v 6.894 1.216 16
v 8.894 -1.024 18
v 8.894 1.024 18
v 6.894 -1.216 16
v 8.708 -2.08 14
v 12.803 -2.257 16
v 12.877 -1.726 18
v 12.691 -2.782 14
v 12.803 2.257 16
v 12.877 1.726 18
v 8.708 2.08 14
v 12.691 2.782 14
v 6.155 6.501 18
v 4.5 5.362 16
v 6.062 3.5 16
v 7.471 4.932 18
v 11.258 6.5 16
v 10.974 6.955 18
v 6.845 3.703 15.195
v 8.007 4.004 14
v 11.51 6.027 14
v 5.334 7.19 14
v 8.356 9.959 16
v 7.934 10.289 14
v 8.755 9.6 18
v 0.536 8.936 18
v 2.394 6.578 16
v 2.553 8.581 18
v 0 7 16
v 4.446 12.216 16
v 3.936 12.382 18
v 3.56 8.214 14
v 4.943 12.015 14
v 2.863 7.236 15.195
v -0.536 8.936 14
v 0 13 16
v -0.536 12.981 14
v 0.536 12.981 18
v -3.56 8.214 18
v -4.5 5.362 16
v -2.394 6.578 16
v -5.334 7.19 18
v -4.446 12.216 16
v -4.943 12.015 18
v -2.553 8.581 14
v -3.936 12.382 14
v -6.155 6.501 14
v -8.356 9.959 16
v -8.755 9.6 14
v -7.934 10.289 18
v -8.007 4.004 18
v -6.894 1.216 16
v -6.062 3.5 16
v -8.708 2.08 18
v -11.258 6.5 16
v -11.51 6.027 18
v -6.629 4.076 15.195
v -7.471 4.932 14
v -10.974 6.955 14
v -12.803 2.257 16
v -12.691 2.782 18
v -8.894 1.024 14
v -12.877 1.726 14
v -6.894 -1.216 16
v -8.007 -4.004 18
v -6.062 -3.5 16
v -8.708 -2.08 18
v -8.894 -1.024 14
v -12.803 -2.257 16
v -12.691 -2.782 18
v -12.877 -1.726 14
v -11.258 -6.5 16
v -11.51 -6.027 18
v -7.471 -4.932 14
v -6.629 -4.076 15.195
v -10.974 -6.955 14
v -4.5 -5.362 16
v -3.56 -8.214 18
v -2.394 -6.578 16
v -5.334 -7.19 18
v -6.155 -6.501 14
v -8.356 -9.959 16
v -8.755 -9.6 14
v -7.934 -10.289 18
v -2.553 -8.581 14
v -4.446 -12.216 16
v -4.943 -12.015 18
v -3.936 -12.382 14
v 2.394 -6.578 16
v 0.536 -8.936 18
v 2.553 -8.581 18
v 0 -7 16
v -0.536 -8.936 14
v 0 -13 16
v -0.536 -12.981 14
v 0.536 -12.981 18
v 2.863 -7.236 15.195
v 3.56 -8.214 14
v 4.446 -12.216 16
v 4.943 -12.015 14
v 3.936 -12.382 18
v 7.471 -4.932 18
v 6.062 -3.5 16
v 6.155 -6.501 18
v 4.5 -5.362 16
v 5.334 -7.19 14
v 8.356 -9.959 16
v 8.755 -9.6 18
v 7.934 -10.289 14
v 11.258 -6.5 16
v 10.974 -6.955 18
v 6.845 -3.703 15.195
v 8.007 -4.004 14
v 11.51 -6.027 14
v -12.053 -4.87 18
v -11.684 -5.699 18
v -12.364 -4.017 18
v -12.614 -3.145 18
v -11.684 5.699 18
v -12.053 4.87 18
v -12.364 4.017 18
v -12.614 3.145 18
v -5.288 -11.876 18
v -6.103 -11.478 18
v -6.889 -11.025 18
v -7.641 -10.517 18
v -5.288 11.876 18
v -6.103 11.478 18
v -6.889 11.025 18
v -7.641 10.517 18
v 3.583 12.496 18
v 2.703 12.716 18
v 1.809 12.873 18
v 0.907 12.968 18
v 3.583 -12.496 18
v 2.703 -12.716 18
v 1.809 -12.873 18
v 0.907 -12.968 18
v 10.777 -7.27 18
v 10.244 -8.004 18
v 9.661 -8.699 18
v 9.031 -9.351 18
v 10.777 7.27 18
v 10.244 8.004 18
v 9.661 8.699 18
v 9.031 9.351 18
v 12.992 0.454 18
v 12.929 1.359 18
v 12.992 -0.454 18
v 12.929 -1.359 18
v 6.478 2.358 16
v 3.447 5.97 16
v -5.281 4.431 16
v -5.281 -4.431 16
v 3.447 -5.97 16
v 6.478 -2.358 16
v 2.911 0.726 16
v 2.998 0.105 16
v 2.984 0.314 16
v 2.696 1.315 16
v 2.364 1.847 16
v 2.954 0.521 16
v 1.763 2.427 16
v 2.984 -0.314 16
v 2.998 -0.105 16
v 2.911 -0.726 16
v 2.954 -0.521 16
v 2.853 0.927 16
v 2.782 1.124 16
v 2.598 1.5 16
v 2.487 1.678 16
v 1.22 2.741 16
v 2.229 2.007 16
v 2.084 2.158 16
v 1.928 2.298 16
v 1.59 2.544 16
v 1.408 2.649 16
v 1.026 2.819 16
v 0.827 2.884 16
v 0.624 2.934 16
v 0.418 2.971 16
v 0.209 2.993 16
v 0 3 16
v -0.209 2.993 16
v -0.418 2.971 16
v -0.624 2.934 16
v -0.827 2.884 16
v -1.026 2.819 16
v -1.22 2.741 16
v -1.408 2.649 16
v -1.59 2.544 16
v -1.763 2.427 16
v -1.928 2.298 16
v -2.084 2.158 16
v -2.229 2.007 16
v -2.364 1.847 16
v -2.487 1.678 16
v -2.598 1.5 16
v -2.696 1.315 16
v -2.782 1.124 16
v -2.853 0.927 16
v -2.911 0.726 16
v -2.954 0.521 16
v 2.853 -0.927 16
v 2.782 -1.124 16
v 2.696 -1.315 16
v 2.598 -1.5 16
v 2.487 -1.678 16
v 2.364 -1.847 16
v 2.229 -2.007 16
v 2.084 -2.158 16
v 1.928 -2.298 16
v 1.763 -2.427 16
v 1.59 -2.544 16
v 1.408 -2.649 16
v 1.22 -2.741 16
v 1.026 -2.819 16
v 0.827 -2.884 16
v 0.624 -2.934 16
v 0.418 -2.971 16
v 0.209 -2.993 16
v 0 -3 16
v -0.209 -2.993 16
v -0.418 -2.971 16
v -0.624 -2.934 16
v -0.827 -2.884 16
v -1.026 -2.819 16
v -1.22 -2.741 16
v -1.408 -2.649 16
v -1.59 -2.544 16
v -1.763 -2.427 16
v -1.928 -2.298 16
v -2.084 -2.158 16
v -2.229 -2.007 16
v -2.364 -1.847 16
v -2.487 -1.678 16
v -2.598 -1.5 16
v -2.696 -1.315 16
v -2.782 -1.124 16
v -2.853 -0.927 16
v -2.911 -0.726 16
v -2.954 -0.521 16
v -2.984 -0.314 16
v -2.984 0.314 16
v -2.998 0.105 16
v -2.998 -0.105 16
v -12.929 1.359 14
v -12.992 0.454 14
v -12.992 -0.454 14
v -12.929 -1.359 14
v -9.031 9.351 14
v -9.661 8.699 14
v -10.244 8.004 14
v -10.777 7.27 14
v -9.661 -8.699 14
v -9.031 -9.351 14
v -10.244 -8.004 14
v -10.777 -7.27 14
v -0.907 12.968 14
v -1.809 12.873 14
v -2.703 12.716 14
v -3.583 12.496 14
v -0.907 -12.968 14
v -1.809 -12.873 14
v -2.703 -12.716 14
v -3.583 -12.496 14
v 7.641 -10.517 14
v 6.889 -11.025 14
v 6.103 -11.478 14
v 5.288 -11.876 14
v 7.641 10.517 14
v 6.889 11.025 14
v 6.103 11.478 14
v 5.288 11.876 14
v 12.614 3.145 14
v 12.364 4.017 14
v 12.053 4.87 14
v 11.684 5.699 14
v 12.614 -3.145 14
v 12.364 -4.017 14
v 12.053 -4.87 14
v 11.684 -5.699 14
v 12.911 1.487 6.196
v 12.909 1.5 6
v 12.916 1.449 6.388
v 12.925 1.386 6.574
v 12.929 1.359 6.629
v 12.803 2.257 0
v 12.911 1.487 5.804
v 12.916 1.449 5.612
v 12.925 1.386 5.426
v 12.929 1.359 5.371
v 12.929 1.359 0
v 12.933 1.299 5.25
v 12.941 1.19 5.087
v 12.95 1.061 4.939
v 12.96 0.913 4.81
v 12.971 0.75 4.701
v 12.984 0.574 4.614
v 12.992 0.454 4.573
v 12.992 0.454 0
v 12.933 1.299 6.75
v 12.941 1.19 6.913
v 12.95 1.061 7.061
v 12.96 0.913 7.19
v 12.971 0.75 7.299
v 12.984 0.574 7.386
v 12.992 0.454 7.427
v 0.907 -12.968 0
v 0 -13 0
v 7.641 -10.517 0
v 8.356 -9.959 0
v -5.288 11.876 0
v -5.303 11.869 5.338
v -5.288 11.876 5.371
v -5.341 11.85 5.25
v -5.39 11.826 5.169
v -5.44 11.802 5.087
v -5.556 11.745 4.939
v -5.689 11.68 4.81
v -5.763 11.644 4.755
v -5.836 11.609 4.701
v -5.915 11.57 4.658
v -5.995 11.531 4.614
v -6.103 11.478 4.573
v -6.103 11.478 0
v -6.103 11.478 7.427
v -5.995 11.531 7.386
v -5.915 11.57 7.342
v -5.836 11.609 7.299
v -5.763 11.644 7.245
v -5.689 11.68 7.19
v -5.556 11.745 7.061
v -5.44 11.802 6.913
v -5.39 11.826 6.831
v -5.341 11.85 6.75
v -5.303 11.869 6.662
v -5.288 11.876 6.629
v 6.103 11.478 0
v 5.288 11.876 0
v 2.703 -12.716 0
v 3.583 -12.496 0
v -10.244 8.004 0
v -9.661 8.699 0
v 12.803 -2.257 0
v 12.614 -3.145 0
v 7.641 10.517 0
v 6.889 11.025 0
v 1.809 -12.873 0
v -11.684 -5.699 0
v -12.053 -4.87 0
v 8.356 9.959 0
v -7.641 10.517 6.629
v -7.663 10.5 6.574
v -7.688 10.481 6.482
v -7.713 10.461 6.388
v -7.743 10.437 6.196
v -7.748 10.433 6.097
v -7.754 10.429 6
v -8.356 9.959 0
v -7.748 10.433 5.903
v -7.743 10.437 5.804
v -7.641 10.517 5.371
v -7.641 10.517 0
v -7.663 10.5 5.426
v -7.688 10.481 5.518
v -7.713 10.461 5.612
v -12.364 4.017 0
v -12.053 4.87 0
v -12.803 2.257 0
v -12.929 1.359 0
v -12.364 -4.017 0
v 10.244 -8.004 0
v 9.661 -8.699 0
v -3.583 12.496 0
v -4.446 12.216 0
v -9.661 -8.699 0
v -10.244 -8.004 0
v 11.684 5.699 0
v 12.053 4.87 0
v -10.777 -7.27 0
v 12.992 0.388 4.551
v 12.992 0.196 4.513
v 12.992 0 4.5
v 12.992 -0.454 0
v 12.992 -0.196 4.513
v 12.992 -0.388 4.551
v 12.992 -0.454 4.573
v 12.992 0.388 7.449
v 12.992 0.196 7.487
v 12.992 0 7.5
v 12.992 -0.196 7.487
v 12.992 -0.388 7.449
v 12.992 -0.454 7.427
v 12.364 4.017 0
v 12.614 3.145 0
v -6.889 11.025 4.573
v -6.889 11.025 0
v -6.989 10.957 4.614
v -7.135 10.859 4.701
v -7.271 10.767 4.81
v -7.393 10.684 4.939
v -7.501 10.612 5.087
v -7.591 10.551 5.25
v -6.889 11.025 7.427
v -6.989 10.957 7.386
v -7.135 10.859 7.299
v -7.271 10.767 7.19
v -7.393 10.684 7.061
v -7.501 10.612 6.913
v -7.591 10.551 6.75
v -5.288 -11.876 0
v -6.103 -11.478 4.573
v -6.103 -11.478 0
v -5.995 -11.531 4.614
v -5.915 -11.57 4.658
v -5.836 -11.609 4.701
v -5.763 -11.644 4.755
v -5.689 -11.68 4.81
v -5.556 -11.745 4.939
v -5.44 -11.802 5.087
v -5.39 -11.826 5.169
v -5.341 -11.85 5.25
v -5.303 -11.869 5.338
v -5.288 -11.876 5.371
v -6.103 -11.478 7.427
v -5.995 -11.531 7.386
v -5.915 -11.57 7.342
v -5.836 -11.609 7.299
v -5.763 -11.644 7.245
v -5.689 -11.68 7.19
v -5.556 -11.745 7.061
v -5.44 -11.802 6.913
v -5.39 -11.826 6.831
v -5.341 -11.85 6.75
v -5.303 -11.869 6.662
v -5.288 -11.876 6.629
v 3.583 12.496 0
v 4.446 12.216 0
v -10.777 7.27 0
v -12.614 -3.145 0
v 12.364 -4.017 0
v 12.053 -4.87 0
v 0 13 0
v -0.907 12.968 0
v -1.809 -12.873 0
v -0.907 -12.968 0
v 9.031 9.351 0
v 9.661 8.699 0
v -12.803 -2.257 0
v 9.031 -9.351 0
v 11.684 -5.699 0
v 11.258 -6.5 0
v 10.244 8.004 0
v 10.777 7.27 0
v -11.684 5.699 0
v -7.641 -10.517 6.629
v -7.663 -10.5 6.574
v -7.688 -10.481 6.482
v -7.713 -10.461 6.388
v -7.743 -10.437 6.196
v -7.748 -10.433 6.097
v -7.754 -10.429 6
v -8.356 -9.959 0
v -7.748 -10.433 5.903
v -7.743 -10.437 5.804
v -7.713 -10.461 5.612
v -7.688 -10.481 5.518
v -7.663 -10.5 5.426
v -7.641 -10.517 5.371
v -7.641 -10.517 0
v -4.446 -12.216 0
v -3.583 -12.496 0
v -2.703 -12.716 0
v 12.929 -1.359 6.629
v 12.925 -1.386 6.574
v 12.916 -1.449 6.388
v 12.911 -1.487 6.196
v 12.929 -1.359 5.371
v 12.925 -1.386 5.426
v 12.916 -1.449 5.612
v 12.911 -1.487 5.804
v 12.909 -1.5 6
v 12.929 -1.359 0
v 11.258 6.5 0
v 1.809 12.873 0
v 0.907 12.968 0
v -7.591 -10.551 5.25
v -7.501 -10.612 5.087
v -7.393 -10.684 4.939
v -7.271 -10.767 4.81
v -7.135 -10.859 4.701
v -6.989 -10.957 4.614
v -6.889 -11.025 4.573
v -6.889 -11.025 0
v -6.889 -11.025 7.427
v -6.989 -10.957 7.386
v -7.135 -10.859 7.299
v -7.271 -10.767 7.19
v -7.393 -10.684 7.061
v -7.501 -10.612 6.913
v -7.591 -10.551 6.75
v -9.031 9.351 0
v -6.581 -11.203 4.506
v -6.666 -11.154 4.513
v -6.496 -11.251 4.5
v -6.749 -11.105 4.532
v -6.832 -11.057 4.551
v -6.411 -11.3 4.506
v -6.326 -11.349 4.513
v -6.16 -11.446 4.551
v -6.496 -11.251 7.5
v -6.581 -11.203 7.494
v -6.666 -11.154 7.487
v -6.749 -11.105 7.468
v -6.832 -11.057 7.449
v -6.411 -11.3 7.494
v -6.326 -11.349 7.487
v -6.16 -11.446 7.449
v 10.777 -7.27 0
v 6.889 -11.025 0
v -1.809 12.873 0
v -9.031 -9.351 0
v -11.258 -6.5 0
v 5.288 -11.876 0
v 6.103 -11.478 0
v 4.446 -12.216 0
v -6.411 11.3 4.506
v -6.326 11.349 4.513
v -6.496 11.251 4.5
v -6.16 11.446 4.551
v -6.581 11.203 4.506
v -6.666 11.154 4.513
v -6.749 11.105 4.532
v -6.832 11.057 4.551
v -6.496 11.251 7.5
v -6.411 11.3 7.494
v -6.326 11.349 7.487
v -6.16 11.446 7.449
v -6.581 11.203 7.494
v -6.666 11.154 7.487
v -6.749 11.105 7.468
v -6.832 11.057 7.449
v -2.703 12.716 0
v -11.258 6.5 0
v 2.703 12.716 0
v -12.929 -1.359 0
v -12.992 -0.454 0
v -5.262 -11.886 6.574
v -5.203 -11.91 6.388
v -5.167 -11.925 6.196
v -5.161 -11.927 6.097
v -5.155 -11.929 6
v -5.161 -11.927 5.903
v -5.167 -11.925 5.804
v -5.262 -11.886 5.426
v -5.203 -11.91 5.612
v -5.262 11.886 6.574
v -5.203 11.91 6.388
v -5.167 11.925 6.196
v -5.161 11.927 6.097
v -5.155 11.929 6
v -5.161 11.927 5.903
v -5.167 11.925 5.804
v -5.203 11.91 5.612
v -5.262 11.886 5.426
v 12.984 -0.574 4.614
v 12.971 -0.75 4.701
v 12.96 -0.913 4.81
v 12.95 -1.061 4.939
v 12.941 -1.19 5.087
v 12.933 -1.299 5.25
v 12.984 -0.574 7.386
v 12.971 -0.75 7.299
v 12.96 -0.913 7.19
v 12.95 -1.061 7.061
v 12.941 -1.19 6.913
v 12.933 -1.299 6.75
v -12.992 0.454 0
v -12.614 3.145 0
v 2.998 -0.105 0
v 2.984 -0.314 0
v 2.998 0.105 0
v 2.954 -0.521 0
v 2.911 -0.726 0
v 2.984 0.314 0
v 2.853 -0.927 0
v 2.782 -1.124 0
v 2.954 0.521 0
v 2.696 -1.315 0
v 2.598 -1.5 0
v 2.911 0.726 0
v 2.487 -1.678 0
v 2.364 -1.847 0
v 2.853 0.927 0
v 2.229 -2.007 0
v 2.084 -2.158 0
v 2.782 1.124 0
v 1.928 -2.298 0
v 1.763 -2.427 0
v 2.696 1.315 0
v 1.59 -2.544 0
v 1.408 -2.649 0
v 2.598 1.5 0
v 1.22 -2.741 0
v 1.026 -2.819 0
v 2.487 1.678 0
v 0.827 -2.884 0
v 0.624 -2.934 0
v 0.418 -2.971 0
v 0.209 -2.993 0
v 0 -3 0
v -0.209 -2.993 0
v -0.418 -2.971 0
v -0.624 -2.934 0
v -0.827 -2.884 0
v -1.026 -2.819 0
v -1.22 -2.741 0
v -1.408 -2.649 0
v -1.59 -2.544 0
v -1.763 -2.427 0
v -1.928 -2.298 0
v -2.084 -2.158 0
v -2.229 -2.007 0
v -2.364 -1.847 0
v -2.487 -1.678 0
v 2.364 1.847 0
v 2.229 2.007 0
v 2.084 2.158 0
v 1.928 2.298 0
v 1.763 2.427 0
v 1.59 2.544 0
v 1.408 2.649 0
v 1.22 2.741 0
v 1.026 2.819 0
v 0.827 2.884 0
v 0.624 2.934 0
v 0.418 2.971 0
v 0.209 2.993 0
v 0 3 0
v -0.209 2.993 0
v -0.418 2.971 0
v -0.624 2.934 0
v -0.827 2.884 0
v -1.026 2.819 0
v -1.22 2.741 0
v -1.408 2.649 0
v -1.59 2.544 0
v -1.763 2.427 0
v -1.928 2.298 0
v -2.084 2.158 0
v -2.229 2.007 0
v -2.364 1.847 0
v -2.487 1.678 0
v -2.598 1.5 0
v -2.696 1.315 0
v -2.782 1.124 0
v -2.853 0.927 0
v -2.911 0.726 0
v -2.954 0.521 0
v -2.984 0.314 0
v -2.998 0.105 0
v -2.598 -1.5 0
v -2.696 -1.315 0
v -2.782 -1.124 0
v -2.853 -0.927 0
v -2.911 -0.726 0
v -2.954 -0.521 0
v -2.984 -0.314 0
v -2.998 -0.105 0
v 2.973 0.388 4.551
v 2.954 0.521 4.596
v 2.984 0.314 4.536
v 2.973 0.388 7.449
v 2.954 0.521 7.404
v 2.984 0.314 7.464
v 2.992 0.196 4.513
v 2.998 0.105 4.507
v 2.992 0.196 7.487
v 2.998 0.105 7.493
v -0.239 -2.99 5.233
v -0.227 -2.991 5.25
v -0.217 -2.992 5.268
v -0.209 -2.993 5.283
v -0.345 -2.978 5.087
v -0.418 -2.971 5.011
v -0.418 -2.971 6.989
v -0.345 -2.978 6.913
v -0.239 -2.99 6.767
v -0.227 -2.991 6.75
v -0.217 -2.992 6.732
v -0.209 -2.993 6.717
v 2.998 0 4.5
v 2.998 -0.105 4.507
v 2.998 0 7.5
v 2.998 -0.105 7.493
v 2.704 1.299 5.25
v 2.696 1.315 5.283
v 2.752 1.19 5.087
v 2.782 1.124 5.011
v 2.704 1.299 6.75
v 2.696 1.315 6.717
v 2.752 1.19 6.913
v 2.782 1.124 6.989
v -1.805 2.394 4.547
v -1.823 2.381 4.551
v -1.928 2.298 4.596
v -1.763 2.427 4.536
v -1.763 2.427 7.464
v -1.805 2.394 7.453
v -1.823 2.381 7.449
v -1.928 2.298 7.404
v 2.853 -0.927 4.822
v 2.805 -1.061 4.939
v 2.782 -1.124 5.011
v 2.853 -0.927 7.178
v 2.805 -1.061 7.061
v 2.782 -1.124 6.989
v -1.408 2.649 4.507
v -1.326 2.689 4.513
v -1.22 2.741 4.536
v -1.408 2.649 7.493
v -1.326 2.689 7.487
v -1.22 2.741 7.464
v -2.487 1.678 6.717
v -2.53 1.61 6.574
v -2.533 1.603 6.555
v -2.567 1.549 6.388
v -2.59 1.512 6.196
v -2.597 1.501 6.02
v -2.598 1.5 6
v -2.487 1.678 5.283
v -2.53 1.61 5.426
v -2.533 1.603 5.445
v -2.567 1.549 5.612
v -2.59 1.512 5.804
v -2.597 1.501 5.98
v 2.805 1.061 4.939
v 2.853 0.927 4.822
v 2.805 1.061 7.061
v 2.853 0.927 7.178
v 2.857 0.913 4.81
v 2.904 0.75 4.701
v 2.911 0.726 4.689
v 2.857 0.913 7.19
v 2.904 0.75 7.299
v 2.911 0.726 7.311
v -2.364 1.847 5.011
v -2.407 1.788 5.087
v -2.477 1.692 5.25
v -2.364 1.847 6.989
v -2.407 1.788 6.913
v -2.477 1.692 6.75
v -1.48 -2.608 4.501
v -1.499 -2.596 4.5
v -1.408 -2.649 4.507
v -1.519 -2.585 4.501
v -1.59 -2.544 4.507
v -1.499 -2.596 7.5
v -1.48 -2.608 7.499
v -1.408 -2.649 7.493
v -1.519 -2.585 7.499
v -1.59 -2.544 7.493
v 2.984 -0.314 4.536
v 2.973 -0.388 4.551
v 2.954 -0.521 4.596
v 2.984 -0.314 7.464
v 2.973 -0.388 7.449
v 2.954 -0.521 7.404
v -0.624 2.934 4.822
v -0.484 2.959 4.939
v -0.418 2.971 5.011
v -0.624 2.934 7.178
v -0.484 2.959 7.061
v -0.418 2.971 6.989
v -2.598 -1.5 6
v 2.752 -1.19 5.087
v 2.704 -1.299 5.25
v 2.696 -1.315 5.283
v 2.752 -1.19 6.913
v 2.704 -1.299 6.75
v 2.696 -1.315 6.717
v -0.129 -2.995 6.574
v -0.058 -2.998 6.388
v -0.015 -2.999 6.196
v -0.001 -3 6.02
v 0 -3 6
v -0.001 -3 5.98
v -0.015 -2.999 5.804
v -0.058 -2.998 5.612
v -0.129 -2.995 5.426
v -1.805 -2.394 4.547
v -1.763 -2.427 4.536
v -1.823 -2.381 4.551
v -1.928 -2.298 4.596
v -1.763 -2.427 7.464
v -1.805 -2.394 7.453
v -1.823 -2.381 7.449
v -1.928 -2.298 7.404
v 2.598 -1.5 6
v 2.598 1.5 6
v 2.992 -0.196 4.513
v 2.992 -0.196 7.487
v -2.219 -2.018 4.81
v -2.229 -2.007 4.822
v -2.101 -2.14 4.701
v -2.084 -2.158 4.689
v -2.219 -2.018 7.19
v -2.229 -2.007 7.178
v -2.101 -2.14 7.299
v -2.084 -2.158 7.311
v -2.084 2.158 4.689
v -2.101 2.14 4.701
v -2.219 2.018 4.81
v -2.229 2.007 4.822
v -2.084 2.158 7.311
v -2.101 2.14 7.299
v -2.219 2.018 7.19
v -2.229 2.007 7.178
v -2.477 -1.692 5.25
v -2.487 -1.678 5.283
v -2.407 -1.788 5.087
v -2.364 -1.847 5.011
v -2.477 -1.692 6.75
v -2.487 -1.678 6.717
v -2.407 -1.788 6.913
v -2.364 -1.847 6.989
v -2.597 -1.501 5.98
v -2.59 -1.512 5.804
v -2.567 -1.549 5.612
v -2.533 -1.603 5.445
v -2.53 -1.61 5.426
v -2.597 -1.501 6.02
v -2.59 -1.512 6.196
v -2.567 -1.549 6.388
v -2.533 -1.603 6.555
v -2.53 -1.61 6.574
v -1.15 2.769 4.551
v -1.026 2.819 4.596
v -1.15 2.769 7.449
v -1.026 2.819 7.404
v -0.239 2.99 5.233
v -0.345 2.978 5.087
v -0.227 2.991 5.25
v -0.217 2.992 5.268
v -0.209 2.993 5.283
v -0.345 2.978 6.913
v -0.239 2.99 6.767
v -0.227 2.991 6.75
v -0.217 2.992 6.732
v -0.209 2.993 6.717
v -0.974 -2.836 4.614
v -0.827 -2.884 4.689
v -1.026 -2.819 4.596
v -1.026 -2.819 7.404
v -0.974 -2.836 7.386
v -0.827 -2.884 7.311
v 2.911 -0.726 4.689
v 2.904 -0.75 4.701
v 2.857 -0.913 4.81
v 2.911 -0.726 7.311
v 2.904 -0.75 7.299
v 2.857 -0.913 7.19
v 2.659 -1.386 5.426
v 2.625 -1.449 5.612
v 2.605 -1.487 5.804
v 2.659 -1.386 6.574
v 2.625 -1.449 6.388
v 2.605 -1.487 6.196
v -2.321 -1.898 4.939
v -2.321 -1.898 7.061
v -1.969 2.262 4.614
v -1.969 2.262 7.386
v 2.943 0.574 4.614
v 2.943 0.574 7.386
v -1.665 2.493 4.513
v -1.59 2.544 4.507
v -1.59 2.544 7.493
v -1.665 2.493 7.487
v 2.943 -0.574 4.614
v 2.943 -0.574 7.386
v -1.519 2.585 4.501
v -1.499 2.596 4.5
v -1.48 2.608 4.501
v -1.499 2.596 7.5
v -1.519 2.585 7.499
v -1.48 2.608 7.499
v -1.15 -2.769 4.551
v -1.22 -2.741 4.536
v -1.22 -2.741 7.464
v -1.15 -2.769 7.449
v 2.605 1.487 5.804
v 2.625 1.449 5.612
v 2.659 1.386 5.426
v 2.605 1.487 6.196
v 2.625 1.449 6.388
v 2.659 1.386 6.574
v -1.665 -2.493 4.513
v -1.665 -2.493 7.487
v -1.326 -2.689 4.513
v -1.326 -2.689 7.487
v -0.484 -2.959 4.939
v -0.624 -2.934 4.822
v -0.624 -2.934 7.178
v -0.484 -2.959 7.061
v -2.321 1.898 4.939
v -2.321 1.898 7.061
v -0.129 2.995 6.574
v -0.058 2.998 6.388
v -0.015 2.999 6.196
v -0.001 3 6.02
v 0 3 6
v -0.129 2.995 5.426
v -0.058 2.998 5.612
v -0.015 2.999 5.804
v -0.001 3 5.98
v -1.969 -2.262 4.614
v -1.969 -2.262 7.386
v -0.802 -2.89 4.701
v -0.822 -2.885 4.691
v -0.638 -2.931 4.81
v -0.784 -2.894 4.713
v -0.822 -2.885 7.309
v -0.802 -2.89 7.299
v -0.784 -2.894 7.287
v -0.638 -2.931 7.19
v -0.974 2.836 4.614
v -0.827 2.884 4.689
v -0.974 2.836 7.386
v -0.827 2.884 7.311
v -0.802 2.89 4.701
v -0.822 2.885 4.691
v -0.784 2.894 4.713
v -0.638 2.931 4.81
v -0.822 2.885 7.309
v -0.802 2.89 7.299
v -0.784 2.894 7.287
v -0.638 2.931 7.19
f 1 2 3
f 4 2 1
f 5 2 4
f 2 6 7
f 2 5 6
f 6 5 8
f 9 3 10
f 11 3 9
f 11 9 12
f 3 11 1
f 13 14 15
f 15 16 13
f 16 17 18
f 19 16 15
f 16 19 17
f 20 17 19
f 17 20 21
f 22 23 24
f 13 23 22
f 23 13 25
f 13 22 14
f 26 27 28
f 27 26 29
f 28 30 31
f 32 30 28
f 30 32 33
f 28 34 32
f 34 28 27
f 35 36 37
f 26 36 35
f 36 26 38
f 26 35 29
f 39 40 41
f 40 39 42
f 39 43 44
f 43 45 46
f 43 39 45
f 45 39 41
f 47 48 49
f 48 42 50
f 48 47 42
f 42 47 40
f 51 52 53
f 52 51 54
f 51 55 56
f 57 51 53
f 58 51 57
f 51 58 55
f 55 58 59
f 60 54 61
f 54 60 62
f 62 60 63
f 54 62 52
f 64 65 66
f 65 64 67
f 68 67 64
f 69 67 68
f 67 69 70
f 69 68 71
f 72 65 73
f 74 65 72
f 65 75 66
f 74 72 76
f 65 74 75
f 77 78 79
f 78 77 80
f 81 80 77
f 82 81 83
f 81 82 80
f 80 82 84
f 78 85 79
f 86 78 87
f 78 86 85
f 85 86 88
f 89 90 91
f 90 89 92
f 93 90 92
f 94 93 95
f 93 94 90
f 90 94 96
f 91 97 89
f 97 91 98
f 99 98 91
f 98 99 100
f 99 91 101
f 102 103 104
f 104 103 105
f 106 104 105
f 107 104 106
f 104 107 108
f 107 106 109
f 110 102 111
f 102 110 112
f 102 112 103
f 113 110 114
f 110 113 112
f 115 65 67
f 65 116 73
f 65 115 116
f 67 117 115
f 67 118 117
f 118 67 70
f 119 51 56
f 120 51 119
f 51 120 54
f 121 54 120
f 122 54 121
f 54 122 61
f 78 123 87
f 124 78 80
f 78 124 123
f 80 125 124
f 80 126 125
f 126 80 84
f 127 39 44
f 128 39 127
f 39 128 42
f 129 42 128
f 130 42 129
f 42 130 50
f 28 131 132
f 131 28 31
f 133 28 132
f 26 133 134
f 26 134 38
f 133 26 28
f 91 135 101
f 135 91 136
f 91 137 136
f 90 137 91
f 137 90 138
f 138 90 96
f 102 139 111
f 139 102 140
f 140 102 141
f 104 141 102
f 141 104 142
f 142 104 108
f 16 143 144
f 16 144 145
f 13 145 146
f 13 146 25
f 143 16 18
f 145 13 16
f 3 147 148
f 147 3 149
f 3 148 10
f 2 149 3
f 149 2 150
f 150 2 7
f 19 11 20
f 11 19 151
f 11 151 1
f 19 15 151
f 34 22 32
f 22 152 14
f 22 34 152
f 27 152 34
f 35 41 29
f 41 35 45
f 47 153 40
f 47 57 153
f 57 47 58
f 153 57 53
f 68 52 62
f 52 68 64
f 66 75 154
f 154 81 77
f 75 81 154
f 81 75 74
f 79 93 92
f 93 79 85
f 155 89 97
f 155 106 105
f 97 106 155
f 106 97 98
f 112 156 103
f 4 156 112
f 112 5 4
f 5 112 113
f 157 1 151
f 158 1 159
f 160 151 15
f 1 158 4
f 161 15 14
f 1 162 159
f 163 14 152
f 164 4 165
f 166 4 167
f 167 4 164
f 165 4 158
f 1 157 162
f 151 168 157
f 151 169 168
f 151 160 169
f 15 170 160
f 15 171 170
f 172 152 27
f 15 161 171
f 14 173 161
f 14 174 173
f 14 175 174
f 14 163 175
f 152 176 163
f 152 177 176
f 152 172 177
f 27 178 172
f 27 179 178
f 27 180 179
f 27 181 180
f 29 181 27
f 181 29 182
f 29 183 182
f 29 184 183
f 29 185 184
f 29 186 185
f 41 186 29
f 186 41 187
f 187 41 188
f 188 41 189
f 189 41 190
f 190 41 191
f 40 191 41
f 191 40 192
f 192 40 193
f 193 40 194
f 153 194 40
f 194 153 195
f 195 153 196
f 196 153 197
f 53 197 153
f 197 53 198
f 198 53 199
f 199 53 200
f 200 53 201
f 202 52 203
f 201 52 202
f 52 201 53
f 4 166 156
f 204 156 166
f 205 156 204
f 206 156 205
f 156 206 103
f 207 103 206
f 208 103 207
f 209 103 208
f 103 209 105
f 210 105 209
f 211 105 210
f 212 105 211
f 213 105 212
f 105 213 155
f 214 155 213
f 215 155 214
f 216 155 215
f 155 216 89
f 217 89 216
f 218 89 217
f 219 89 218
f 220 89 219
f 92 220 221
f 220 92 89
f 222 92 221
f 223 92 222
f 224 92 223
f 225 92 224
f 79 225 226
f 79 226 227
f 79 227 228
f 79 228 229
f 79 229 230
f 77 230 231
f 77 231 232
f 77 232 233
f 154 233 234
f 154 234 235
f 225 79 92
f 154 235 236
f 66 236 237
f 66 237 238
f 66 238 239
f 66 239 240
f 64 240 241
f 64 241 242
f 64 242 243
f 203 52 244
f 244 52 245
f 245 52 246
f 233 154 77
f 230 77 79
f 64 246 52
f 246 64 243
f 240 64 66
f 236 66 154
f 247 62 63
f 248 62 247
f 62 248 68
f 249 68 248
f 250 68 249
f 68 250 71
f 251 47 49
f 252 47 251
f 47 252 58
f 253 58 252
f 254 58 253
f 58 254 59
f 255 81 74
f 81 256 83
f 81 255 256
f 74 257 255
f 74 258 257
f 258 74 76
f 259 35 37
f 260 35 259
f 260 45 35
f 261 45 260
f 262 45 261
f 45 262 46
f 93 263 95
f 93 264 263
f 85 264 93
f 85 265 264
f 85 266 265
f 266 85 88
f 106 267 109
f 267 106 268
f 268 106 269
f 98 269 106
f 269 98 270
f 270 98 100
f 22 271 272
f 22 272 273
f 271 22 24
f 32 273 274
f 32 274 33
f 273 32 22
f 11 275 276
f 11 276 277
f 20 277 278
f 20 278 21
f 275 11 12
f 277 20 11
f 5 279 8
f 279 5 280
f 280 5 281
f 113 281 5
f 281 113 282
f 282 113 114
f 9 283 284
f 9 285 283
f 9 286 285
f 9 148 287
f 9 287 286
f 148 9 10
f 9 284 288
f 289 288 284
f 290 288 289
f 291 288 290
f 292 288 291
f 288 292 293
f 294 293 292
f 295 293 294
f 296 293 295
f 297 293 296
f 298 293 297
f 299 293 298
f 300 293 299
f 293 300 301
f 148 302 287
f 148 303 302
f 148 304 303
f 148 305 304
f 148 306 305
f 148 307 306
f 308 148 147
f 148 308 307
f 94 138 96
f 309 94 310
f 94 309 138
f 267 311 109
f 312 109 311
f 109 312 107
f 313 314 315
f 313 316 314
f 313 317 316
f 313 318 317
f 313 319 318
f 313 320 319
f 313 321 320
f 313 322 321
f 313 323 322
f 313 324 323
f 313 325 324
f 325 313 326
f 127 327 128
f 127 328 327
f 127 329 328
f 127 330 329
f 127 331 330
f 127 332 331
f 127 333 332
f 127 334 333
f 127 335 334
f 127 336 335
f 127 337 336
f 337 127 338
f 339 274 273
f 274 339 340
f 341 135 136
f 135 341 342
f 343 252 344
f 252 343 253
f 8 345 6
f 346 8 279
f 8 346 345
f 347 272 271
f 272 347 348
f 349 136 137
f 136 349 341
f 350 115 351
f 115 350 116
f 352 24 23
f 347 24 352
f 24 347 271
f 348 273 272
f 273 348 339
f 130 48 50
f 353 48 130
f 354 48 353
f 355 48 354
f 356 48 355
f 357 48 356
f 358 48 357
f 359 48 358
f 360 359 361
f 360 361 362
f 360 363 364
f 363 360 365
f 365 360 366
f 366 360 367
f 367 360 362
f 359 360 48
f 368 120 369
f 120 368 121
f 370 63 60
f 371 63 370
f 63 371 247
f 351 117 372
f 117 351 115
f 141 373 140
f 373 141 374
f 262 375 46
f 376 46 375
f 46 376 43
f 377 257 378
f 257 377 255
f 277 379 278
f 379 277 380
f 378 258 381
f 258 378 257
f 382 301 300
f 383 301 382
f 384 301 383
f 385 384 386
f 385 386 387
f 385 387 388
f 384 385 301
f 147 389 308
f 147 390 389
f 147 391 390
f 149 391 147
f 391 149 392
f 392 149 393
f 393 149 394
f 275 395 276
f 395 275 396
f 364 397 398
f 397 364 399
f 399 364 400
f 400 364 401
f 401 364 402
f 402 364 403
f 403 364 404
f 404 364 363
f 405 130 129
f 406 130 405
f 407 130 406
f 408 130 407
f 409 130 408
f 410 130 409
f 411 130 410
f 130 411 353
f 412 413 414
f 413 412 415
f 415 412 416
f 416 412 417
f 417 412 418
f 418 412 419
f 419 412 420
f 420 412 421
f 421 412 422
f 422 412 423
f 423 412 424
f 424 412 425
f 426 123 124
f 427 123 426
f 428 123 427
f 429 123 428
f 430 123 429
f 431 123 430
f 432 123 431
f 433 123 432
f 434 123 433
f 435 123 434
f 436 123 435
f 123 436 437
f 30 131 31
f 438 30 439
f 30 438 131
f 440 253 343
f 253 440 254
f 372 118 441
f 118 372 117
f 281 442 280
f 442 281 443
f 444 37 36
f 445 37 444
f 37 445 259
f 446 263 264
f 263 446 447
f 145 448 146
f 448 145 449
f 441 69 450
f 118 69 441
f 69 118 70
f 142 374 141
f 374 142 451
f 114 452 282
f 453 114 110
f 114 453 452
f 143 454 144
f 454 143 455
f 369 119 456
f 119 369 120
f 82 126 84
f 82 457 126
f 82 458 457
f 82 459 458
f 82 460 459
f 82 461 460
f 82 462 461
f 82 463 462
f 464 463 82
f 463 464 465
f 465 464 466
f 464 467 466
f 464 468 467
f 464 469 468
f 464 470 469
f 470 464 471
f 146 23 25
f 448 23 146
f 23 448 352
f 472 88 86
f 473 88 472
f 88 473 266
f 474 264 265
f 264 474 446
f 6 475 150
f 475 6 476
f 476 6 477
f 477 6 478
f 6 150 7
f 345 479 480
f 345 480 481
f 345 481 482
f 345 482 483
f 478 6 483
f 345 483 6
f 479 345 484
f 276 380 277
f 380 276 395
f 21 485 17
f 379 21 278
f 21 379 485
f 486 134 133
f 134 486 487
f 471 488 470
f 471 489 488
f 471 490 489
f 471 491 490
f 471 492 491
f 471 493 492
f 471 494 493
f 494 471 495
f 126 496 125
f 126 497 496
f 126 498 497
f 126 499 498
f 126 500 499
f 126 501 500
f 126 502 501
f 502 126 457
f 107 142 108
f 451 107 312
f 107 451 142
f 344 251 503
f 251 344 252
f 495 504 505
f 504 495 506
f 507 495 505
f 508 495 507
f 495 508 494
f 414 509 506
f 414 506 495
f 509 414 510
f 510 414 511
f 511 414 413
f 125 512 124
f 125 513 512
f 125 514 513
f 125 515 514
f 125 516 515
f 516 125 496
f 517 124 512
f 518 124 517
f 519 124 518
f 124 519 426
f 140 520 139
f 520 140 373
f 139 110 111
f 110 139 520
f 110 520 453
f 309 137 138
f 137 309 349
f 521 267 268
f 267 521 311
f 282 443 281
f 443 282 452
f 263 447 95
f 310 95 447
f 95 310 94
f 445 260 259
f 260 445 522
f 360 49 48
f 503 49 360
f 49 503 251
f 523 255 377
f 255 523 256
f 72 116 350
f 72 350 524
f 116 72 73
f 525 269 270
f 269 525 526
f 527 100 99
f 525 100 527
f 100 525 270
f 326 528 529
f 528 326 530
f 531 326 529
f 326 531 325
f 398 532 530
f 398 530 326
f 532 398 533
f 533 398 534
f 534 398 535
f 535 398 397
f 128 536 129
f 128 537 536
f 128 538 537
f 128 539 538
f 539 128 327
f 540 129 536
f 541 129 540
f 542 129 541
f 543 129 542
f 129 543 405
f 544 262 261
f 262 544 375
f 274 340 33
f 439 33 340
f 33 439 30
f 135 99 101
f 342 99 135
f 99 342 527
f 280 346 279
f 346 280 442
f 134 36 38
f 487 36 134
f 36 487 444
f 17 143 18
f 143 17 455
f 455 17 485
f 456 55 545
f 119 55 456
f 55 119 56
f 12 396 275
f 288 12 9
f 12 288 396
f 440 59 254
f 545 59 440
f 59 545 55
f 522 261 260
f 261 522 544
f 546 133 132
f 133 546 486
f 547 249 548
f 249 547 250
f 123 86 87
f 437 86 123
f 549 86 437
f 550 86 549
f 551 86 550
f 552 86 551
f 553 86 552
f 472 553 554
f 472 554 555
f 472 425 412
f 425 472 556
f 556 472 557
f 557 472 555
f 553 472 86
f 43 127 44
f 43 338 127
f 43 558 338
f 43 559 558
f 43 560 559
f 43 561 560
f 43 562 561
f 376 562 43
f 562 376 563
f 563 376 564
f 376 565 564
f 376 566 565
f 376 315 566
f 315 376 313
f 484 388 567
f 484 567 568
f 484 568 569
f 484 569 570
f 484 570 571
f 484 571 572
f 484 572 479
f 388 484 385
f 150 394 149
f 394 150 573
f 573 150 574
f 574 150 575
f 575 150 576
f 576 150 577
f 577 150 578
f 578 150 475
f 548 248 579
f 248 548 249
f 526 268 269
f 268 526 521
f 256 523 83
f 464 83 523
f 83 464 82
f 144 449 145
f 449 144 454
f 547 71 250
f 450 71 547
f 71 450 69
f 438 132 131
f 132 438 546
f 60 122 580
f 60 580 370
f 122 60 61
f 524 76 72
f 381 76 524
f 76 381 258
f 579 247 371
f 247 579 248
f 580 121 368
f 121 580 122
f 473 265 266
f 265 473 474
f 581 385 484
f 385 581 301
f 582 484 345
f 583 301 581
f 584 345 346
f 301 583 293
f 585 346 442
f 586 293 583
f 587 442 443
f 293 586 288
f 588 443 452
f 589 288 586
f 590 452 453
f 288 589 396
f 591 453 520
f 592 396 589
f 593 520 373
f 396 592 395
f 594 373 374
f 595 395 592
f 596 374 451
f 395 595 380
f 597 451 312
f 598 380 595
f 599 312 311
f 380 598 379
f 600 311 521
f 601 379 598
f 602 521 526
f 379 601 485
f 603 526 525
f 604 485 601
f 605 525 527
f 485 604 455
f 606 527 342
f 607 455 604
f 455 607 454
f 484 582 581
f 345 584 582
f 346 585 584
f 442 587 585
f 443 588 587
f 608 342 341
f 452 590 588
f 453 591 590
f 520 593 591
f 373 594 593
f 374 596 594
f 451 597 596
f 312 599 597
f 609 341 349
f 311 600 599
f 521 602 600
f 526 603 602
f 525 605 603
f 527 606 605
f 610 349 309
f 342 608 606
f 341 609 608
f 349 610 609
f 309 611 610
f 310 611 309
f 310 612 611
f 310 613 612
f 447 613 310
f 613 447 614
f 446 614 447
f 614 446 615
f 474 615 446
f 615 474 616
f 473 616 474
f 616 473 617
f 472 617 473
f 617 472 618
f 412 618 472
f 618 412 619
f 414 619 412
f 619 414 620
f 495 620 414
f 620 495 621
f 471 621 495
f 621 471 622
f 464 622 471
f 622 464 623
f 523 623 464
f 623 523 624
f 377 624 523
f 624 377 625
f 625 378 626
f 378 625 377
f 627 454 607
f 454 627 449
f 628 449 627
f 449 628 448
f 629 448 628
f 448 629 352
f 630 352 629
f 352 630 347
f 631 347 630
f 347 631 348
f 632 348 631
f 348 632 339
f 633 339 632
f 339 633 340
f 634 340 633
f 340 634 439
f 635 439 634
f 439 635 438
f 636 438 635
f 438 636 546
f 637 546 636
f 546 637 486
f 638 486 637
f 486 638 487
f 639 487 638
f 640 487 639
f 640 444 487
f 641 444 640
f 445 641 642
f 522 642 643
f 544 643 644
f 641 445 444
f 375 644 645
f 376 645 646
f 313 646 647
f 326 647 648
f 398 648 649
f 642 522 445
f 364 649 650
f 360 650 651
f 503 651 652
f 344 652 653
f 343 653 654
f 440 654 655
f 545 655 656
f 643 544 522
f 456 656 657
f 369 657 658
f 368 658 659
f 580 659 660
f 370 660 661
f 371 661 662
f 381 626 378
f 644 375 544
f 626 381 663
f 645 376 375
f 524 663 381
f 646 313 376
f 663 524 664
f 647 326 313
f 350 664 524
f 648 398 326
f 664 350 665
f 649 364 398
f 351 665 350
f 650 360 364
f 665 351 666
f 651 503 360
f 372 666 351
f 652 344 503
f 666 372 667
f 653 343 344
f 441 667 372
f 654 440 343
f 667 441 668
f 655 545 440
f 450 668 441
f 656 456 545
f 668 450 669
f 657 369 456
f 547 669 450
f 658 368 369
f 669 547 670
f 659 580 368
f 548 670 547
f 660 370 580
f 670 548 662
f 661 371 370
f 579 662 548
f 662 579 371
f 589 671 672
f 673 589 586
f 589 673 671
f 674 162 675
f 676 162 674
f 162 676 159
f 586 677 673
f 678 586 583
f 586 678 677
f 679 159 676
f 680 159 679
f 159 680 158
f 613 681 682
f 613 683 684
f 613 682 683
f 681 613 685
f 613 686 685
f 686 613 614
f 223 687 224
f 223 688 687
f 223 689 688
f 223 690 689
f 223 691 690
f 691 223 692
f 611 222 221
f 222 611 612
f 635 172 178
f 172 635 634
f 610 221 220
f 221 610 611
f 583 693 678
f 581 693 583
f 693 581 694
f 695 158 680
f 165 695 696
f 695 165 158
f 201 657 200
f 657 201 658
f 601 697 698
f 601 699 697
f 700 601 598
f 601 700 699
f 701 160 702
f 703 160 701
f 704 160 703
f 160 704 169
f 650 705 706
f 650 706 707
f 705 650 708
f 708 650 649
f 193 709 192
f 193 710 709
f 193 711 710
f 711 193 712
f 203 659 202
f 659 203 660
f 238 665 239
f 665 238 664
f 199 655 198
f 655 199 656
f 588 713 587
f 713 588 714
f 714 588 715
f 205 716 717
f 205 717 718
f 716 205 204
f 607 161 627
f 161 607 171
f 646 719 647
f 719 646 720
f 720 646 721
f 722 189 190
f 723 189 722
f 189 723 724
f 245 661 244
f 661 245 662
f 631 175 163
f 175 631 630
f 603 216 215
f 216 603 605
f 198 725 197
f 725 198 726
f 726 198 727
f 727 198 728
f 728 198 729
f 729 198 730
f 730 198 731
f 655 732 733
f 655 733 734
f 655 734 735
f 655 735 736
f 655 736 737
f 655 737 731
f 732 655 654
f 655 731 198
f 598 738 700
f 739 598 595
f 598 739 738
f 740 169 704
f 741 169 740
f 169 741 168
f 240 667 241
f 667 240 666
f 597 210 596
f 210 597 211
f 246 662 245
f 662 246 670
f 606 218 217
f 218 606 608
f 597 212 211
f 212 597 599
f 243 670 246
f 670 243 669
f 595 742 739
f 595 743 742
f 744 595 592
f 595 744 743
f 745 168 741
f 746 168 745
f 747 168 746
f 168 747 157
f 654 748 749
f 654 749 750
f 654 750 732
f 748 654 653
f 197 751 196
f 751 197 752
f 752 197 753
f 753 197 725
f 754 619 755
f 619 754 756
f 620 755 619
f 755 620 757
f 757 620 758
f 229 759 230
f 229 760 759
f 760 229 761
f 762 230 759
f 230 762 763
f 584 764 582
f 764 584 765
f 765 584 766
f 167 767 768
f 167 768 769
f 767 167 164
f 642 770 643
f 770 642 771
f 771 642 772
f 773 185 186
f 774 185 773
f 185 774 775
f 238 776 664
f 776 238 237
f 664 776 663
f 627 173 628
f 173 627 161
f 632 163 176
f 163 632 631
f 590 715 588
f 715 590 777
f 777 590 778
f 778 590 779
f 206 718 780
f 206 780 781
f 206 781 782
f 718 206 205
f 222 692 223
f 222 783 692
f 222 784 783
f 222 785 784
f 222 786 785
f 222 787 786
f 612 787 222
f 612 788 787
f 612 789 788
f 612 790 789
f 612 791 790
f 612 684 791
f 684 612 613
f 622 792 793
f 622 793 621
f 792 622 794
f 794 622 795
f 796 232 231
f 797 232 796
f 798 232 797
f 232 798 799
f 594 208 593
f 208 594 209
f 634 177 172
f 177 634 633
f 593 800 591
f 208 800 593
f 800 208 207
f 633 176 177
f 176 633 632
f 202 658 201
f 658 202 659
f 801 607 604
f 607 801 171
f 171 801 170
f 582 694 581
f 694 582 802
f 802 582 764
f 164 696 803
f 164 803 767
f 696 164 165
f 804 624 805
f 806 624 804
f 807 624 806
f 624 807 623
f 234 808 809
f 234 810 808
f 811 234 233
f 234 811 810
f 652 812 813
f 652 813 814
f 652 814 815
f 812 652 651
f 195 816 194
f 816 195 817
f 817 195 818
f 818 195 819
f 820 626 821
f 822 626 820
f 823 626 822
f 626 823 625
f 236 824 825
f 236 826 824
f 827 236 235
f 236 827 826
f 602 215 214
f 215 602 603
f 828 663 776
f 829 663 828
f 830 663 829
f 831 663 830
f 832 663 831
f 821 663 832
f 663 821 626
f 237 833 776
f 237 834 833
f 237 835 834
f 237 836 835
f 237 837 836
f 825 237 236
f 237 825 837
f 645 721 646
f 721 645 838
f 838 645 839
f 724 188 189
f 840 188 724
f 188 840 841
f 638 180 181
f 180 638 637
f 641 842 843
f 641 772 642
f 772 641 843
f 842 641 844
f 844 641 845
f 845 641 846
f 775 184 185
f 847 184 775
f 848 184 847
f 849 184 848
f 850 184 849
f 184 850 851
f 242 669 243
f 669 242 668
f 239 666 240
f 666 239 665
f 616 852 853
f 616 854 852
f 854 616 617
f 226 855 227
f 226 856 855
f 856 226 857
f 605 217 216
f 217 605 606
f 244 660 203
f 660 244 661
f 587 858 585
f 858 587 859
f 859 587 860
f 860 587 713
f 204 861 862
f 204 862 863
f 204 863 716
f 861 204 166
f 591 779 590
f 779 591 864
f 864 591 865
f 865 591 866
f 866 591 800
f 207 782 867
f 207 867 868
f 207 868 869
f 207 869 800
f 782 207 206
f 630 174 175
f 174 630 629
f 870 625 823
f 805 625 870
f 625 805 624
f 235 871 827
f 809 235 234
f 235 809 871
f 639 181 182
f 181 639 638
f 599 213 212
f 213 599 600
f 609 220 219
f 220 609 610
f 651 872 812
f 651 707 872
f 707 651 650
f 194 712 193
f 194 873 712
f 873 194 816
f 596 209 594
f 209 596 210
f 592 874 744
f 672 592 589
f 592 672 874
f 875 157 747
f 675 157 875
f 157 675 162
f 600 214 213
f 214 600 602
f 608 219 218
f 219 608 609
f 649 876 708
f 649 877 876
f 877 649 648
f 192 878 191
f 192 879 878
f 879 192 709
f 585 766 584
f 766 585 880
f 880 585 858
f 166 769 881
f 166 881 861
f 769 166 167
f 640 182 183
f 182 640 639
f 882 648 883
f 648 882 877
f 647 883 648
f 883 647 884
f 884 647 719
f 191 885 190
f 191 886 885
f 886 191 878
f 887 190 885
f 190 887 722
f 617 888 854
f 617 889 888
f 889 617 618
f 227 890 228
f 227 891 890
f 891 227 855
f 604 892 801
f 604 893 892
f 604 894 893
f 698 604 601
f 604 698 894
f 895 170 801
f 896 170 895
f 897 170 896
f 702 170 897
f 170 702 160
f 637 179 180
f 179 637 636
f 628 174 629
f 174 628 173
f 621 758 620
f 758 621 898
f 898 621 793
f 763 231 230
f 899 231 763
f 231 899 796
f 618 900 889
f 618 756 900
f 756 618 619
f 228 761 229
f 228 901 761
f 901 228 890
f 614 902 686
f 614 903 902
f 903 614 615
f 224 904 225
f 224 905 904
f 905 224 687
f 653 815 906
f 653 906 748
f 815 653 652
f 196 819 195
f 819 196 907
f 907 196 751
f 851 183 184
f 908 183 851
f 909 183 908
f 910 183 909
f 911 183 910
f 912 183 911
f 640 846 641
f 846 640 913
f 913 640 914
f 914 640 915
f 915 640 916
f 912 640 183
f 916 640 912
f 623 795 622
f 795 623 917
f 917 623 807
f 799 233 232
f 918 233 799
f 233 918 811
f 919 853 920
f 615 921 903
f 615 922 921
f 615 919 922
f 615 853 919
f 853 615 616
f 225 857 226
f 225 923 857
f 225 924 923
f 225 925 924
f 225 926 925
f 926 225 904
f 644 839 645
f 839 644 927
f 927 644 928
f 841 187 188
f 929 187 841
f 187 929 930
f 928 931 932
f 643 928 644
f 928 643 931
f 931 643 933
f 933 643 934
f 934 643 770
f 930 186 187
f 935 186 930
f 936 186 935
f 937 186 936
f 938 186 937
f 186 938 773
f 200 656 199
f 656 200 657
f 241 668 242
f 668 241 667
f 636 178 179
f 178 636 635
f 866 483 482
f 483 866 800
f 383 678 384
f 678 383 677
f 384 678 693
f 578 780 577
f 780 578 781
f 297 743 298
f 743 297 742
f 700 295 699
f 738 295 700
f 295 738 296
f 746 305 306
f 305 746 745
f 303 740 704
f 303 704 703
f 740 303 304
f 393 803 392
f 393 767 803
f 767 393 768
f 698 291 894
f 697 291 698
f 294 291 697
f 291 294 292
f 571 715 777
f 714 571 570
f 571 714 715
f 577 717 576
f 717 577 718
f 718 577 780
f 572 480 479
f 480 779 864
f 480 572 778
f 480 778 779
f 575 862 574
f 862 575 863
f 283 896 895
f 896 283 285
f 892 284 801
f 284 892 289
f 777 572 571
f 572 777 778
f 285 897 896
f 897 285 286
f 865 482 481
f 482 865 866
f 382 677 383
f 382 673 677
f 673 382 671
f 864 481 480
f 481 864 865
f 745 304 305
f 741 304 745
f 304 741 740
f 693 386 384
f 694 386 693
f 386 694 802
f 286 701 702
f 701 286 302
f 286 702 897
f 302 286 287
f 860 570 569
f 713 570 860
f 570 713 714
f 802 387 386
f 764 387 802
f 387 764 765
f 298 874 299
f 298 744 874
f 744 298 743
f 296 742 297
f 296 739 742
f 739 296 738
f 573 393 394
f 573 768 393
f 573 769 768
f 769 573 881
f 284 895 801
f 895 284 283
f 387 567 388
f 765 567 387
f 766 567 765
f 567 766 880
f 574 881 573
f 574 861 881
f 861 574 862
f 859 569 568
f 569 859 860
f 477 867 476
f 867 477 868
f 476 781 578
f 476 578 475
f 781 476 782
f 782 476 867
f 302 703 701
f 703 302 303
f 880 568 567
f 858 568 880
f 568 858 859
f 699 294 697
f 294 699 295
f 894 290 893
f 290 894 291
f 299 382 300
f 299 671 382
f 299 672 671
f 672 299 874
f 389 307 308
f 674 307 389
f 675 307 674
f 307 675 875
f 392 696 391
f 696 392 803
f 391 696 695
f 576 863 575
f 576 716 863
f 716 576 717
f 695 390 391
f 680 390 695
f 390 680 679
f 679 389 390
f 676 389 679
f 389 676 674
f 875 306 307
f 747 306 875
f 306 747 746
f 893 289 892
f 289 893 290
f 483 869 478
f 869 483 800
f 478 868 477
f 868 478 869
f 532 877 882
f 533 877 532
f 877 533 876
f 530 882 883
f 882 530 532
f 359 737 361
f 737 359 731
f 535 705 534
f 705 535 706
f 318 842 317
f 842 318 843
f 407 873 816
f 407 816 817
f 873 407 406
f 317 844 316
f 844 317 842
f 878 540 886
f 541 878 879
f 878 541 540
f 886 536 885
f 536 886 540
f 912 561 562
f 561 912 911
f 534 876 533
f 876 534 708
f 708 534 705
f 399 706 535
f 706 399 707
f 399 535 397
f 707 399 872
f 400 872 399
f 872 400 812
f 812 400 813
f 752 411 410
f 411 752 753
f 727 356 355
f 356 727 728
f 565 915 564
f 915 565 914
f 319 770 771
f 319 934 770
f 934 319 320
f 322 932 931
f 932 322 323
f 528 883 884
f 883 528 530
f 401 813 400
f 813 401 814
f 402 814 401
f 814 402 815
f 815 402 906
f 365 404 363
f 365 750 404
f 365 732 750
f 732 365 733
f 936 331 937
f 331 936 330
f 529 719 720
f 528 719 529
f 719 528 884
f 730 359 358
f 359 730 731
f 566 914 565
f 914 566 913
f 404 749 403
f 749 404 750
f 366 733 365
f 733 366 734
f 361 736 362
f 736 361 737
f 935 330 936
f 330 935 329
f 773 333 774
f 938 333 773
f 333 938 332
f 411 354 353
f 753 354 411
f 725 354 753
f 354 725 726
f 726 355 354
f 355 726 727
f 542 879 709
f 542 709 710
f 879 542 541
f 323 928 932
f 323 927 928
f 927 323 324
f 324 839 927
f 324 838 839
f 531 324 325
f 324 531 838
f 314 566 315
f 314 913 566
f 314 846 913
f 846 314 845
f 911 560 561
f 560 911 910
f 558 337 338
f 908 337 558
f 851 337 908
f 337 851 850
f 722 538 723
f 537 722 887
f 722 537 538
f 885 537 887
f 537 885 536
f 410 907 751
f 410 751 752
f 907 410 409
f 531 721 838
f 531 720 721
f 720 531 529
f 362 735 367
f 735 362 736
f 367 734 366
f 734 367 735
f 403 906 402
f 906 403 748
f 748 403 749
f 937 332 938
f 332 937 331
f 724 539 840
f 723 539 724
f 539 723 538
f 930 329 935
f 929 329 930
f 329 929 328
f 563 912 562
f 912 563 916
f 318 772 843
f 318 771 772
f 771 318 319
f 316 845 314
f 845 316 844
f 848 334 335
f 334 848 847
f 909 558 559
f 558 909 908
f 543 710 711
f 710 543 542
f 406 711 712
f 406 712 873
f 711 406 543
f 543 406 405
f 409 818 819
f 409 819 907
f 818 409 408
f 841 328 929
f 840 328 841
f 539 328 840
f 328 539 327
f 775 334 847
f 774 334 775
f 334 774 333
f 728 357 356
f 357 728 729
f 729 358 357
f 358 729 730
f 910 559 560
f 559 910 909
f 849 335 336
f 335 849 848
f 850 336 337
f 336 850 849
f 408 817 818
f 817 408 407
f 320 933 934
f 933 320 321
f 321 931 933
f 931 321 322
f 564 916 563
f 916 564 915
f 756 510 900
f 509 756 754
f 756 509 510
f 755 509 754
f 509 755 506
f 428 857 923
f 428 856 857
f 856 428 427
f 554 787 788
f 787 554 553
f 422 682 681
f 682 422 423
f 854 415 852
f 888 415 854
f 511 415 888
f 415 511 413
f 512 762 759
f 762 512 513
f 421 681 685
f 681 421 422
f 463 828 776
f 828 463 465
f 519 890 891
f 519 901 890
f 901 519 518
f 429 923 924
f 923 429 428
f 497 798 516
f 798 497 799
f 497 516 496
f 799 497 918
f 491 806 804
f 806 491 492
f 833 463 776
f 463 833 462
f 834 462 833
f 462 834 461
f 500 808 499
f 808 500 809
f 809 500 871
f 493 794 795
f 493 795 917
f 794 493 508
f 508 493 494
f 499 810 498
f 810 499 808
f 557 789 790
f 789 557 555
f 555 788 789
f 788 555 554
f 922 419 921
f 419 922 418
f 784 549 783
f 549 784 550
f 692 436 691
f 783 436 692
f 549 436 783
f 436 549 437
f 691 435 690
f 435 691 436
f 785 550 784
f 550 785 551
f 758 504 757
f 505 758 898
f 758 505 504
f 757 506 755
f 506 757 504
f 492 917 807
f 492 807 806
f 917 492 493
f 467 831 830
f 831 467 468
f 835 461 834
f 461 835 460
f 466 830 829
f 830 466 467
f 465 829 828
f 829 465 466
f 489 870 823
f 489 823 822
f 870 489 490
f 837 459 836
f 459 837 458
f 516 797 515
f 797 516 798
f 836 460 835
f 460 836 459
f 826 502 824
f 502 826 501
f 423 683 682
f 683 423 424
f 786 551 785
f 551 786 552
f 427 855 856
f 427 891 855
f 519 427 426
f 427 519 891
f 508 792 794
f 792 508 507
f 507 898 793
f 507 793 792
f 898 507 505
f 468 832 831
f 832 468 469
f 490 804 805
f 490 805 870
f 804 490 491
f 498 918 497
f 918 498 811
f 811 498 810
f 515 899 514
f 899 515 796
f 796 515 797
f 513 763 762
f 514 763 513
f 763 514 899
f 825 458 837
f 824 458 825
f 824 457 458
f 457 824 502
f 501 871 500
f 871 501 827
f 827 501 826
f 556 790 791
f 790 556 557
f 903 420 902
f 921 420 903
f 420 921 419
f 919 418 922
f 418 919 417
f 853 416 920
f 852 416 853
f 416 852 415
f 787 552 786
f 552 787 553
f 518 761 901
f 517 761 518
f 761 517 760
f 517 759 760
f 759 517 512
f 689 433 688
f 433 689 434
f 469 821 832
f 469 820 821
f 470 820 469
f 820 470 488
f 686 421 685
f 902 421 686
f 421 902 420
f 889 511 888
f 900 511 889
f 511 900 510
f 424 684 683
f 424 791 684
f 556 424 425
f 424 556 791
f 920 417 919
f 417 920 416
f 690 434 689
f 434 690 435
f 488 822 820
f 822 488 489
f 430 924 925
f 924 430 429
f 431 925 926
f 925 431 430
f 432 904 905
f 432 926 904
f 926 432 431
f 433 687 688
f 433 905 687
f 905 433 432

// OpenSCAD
// author:  Lukas Süss aka mechadense
// date:    2014-07
// title:   Hirth-Joint (CSG version)
// license: public domain

/*
Customizable Hith Joint (CSG version) (library)

This is an improved version of
http://www.thingiverse.com/thing:387292

This improved model can start the teeth not just at the center but also at a polygon of choosable radius. Meaning one can create thin walled tube couplings that are radially self centering (Such couplings are often found in Mountainbike axles).

The interpenetration depth of the teeth can be limited with the flatlimit parameter.


## Specialised functions
hirthaxle(l,d,dbore,n,beta,delta,flatlimit)
hirthtube(l,d,dbore,n,beta,delta,flatlimit)
"axle"-postfix: all teeth converge to the center
"tube"-postfix: all teeth emerge from the polygon inscribed into the bore diameter

## Convinience functions that make the coupling printeable upside down:
supportlesshirthaxle(l,d,dbore,n,beta,delta,flatlimit)
supportlesshirthtube(l,d,dbore,n,beta,delta,flatlimit)
"supportless"-prefix: optimized for upside down supportless printability

## Full functonatlity:
hirth(l,d,dbore,dpolygon,n,beta,delta,flatlimit,inlimit)
rawhirth(beta,delta,n,dpolygon,flatlimit,inlimit)

Notes regarding the first design:
* The parametric interdependencies behave a little different in this model!
* Using volumetric CSG descriptions turns out to be a lot easier than triangle vertex juggling.

###################

refactor:
d0 -> dout0
dbore0 -> din0
same for 00's

Maybe:

Add an asymmetry parameter "ddelta" that rotates the teeth upwards and a "dbeta" to compensate for the emerging difference in tooth bottom- and top-wideness. Since the coupling becomes asymmetric a countermpart needs to be made from negative space.
make grid with random parameters -- echo(rands(0,10,2));

Check if inward facing (or combined inward outward) teeth are possible too.
=> seems nontrivial


Known problems:
  using rawhirth(...) with intersection works fine
  using rawhirth(...) with difference not - why ??
*/


// ##########################


/* [Character] */

// symmetry
  n0 = 9; // [2:60]
// flank angle
  beta0 = 15;
// cone angle (>0)
  delta0_ = 45;
  delta0 = abs(delta0_);
// size of flat center polygon (edge to edge)
  dpolygon0 = 14;

// (ab)using 0 is BAD!
// maximum interlocking/interpenetration depth  (0.. no limit)
  flatlimit0 = 2;
// 0 -> improve upside down printability
  inlimit00 = 1; // [0:1]
  inlimit0 = (inlimit00==0) ? false : true;




/* [Size] */

// height of hirth-joint bottom to center
  l0 = 16;
// outer hirth-coupling diameter
  d00 = 26;
// size of center bore
  dbore00 = 6;

// outer polygon diameter: [0...corner to corner | 1...width across flats]
measureout = 1; // [0:1]
// inner polygon diameter: [0...corner to corner | 1...width across flats]
measurein = 1; // [0:1]

// (ab)using 0 is BAD!
// number of outer edges (0...circle)
  nout0 = 0; // [0,3,4,5,6,7,8,9,10,11,12]
// number of inner edges (0...circle)
  nin0 = 0; // [0,3,4,5,6,7,8,9,10,11,12]

d0 = (measureout==0 || nout0==0 ) ? d00 : d00 / cos(360/(nout0*2));
dbore0 = (measurein ==0 || nin0==0 ) ? dbore00 : dbore00 / cos(360/(nin0 *2));



/* [Resolution] */

  $fa = 4;
  $fs = 0.2;

// Openscad internal stuff needed to be reimplemented:
function resol(r) = min(360/$fa, max(6,2*3.1415*r/$fs)); 



/* [Sidehole] */

// hight of sidehole for wormscrew (or whatever)
  hsidehole = 6;
// diameter of sidehole for wormscrew (or whatever)
  dsidehole = 3;
// number of sideholes
  nsidehole = 3;



/* [Keep big] */

s0 = 50;



/* [Hidden] */

colorred   = [1,0.3,0.2]*1;
colorgreen  = [0.15,0.65,0.1]*1;
colorblue = [0.3,0.4,0.7]*1;

explx = 16*1;
exply = 30*1;
exply2 =25*1;
shift = 3*1;
eps = 0.05*0;

// ##################################
// -------------------------------- examples

customizable();
//demo();


// customizer default parameter part (tube-example)
module customizable()
{
  difference()
  {
    color(colorred) translate([0,0,l0+eps]) // <<<<<<< color hack
      hirth(l0,d0,dbore0,dpolygon0,n0,beta0,delta0,flatlimit0,inlimit0);
    for(i=[0:nsidehole-1])
    {
      rotate(360/nsidehole*i,[0,0,1])
      translate([0,0,hsidehole]) rotate(90,[0,1,0])
        cylinder(r=dsidehole/2,h=d0);
    }
  }
}


module demo()
{
  translate([shift,0,10])
  {
    translate([-explx,-exply2,0])
      axledemo();
    translate([-explx,+exply2,0])
      axledemo(2,true);

    translate([+explx,-exply,0])
      tubedemo();
    translate([+explx,+exply,0])
      tubedemo(3,true); // for supportless upside down printing
  }
}



module axledemo(flatlimit = 0, inlimit = false) // backwardcapability-demo
{
  color(colorgreen)
  if(!inlimit)
  {   hirthaxle(10,20,3,6,15,12.5,flatlimit);  } else
  {   supportlesshirthaxle(10,20,6,5,15,25,flatlimit);  }
}


module tubedemo(flatlimit = 0, inlimit = false)
{
  color(colorblue)
  if (!inlimit)
  {  hirthtube(10,32,20,8, 5,45, flatlimit);  } else
  {  supportlesshirthtube(10,32,20,12, 5,45, flatlimit);  }
}



// -----------------------------------  convenience functions



// axle couplings
module hirthaxle(l,d,dbore,n,beta,delta,flatlimit)
{
  dpolygon = 0; inlimit = true;
  hirth(l,d,dbore,  0  ,n,beta,delta,flatlimit,  inlimit); 
}
// axle couplings && well upside down printable
module supportlesshirthaxle(l,d,dbore,n,beta,delta,flatlimit)
{
  dpolygon = 0; inlimit = false;
  hirth(l,d,dbore,  0  ,n,beta,delta,flatlimit,  inlimit);
}



// for self centering tube couplings
module hirthtube(l,d,dbore,n,beta,delta,flatlimit)
{
  dpolygon = dbore; inlimit = true;
  hirth(l,d,dbore,  dpolygon , n,beta,delta,flatlimit,  inlimit);
}

// for self centering tube saped couplings  &&  well upside down printable
module supportlesshirthtube(l,d,dbore,n,beta,delta,flatlimit)
{
  dpolygon = dbore; inlimit = false;
  hirth(l,d,dbore,  dpolygon  ,n,beta,delta,flatlimit,  inlimit);
}


// ------------------------------------- fundamental functions

// basic hirth joint cut to a cylindrical ring 
module hirth(l,d,dbore,dpolygon,n,beta,delta,flatlimit,inlimit)
{

  cornersout = (nout0==0) ? resol(d/2) : nout0;
  cornersin  = (nin0==0) ? resol(dbore/2) : nin0;

  difference()
  {
    intersection()
    {
      rawhirth(dpolygon,n,beta,delta,flatlimit,inlimit);
      rotate(360/(cornersout*2),[0,0,1])
        cylinder(r=d/2,h=2*l,center=true,$fn=cornersout);
    }

    // unintuitive ugly hack
    // to avoid further parameter <<<<<<<<<<<<<<<<<<<<<<<<<<<<<<<
    //checking (dbore == dpolygon) woud lead to unintuitive behaviour 
    if(inlimit != false || true) 
    {
      rotate(360/(cornersin*2),[0,0,1])
        cylinder(r=dbore/2,h=2.2*l,center=true,$fn=cornersin);
    }
    else // disabled
    { 
      rotate(360/n/4,[0,0,1])
        // polygon avoids blade arcs
        cylinder(r=dbore/2,h=2*(l0+eps),center=true,$fn=2*n);
    }

  }
}

// "infinite" sized raw hirth coupling ( if hs() where a true halfspace )
module rawhirth(dpolygon,
                n,
                beta,
                delta,
                flatlimit  = 0,
                inlimit = false,
                s = s0)
{
  // size of flat center polygon (side to side)
  shift = dpolygon*cos(360/n/4);

  // angle per period
  a = 360/n;

  // outward upward flanks
  intersection()
  {
    for(i=[0:n-1])
    {
      rotate(360*i/n,[0,0,1])
      intersection()
      {
        translate([shift/2,0,0]) 
        rotate(-delta,[0,1,0]) hs(s);
        rotate(-a/4,[0,0,1])
        rotate(+(90-beta),[1,0,0]) hs(s);
        rotate(+a/4,[0,0,1])
        rotate(-(90-beta),[1,0,0]) hs(s);
      }
    }
    if (flatlimit!=0) { translate([0,0,flatlimit]) hs(s); }
  }

  // inward downward flanks and solid lower body
  union()
  {
    intersection()
    {
      intersection_for(i = [0 : n])
      {
        rotate(360*(i+1/2)/n,[0,0,1])
        translate([shift/2,0,0]) 
        rotate(+delta,[0,1,0]) hs(s);
      }
      hs(s);
    }
    if(flatlimit!=0 && inlimit == true)
    { 
      // cut the teeth bottoms off (flat)
      translate([0,0,-flatlimit0]) hs(s);
    }
     
  }

}


// halfspace (big-cube-approximation)
module hs(s)
{
  translate([0,0,-s/2])
    cube([s,s,s],center=true);
}
